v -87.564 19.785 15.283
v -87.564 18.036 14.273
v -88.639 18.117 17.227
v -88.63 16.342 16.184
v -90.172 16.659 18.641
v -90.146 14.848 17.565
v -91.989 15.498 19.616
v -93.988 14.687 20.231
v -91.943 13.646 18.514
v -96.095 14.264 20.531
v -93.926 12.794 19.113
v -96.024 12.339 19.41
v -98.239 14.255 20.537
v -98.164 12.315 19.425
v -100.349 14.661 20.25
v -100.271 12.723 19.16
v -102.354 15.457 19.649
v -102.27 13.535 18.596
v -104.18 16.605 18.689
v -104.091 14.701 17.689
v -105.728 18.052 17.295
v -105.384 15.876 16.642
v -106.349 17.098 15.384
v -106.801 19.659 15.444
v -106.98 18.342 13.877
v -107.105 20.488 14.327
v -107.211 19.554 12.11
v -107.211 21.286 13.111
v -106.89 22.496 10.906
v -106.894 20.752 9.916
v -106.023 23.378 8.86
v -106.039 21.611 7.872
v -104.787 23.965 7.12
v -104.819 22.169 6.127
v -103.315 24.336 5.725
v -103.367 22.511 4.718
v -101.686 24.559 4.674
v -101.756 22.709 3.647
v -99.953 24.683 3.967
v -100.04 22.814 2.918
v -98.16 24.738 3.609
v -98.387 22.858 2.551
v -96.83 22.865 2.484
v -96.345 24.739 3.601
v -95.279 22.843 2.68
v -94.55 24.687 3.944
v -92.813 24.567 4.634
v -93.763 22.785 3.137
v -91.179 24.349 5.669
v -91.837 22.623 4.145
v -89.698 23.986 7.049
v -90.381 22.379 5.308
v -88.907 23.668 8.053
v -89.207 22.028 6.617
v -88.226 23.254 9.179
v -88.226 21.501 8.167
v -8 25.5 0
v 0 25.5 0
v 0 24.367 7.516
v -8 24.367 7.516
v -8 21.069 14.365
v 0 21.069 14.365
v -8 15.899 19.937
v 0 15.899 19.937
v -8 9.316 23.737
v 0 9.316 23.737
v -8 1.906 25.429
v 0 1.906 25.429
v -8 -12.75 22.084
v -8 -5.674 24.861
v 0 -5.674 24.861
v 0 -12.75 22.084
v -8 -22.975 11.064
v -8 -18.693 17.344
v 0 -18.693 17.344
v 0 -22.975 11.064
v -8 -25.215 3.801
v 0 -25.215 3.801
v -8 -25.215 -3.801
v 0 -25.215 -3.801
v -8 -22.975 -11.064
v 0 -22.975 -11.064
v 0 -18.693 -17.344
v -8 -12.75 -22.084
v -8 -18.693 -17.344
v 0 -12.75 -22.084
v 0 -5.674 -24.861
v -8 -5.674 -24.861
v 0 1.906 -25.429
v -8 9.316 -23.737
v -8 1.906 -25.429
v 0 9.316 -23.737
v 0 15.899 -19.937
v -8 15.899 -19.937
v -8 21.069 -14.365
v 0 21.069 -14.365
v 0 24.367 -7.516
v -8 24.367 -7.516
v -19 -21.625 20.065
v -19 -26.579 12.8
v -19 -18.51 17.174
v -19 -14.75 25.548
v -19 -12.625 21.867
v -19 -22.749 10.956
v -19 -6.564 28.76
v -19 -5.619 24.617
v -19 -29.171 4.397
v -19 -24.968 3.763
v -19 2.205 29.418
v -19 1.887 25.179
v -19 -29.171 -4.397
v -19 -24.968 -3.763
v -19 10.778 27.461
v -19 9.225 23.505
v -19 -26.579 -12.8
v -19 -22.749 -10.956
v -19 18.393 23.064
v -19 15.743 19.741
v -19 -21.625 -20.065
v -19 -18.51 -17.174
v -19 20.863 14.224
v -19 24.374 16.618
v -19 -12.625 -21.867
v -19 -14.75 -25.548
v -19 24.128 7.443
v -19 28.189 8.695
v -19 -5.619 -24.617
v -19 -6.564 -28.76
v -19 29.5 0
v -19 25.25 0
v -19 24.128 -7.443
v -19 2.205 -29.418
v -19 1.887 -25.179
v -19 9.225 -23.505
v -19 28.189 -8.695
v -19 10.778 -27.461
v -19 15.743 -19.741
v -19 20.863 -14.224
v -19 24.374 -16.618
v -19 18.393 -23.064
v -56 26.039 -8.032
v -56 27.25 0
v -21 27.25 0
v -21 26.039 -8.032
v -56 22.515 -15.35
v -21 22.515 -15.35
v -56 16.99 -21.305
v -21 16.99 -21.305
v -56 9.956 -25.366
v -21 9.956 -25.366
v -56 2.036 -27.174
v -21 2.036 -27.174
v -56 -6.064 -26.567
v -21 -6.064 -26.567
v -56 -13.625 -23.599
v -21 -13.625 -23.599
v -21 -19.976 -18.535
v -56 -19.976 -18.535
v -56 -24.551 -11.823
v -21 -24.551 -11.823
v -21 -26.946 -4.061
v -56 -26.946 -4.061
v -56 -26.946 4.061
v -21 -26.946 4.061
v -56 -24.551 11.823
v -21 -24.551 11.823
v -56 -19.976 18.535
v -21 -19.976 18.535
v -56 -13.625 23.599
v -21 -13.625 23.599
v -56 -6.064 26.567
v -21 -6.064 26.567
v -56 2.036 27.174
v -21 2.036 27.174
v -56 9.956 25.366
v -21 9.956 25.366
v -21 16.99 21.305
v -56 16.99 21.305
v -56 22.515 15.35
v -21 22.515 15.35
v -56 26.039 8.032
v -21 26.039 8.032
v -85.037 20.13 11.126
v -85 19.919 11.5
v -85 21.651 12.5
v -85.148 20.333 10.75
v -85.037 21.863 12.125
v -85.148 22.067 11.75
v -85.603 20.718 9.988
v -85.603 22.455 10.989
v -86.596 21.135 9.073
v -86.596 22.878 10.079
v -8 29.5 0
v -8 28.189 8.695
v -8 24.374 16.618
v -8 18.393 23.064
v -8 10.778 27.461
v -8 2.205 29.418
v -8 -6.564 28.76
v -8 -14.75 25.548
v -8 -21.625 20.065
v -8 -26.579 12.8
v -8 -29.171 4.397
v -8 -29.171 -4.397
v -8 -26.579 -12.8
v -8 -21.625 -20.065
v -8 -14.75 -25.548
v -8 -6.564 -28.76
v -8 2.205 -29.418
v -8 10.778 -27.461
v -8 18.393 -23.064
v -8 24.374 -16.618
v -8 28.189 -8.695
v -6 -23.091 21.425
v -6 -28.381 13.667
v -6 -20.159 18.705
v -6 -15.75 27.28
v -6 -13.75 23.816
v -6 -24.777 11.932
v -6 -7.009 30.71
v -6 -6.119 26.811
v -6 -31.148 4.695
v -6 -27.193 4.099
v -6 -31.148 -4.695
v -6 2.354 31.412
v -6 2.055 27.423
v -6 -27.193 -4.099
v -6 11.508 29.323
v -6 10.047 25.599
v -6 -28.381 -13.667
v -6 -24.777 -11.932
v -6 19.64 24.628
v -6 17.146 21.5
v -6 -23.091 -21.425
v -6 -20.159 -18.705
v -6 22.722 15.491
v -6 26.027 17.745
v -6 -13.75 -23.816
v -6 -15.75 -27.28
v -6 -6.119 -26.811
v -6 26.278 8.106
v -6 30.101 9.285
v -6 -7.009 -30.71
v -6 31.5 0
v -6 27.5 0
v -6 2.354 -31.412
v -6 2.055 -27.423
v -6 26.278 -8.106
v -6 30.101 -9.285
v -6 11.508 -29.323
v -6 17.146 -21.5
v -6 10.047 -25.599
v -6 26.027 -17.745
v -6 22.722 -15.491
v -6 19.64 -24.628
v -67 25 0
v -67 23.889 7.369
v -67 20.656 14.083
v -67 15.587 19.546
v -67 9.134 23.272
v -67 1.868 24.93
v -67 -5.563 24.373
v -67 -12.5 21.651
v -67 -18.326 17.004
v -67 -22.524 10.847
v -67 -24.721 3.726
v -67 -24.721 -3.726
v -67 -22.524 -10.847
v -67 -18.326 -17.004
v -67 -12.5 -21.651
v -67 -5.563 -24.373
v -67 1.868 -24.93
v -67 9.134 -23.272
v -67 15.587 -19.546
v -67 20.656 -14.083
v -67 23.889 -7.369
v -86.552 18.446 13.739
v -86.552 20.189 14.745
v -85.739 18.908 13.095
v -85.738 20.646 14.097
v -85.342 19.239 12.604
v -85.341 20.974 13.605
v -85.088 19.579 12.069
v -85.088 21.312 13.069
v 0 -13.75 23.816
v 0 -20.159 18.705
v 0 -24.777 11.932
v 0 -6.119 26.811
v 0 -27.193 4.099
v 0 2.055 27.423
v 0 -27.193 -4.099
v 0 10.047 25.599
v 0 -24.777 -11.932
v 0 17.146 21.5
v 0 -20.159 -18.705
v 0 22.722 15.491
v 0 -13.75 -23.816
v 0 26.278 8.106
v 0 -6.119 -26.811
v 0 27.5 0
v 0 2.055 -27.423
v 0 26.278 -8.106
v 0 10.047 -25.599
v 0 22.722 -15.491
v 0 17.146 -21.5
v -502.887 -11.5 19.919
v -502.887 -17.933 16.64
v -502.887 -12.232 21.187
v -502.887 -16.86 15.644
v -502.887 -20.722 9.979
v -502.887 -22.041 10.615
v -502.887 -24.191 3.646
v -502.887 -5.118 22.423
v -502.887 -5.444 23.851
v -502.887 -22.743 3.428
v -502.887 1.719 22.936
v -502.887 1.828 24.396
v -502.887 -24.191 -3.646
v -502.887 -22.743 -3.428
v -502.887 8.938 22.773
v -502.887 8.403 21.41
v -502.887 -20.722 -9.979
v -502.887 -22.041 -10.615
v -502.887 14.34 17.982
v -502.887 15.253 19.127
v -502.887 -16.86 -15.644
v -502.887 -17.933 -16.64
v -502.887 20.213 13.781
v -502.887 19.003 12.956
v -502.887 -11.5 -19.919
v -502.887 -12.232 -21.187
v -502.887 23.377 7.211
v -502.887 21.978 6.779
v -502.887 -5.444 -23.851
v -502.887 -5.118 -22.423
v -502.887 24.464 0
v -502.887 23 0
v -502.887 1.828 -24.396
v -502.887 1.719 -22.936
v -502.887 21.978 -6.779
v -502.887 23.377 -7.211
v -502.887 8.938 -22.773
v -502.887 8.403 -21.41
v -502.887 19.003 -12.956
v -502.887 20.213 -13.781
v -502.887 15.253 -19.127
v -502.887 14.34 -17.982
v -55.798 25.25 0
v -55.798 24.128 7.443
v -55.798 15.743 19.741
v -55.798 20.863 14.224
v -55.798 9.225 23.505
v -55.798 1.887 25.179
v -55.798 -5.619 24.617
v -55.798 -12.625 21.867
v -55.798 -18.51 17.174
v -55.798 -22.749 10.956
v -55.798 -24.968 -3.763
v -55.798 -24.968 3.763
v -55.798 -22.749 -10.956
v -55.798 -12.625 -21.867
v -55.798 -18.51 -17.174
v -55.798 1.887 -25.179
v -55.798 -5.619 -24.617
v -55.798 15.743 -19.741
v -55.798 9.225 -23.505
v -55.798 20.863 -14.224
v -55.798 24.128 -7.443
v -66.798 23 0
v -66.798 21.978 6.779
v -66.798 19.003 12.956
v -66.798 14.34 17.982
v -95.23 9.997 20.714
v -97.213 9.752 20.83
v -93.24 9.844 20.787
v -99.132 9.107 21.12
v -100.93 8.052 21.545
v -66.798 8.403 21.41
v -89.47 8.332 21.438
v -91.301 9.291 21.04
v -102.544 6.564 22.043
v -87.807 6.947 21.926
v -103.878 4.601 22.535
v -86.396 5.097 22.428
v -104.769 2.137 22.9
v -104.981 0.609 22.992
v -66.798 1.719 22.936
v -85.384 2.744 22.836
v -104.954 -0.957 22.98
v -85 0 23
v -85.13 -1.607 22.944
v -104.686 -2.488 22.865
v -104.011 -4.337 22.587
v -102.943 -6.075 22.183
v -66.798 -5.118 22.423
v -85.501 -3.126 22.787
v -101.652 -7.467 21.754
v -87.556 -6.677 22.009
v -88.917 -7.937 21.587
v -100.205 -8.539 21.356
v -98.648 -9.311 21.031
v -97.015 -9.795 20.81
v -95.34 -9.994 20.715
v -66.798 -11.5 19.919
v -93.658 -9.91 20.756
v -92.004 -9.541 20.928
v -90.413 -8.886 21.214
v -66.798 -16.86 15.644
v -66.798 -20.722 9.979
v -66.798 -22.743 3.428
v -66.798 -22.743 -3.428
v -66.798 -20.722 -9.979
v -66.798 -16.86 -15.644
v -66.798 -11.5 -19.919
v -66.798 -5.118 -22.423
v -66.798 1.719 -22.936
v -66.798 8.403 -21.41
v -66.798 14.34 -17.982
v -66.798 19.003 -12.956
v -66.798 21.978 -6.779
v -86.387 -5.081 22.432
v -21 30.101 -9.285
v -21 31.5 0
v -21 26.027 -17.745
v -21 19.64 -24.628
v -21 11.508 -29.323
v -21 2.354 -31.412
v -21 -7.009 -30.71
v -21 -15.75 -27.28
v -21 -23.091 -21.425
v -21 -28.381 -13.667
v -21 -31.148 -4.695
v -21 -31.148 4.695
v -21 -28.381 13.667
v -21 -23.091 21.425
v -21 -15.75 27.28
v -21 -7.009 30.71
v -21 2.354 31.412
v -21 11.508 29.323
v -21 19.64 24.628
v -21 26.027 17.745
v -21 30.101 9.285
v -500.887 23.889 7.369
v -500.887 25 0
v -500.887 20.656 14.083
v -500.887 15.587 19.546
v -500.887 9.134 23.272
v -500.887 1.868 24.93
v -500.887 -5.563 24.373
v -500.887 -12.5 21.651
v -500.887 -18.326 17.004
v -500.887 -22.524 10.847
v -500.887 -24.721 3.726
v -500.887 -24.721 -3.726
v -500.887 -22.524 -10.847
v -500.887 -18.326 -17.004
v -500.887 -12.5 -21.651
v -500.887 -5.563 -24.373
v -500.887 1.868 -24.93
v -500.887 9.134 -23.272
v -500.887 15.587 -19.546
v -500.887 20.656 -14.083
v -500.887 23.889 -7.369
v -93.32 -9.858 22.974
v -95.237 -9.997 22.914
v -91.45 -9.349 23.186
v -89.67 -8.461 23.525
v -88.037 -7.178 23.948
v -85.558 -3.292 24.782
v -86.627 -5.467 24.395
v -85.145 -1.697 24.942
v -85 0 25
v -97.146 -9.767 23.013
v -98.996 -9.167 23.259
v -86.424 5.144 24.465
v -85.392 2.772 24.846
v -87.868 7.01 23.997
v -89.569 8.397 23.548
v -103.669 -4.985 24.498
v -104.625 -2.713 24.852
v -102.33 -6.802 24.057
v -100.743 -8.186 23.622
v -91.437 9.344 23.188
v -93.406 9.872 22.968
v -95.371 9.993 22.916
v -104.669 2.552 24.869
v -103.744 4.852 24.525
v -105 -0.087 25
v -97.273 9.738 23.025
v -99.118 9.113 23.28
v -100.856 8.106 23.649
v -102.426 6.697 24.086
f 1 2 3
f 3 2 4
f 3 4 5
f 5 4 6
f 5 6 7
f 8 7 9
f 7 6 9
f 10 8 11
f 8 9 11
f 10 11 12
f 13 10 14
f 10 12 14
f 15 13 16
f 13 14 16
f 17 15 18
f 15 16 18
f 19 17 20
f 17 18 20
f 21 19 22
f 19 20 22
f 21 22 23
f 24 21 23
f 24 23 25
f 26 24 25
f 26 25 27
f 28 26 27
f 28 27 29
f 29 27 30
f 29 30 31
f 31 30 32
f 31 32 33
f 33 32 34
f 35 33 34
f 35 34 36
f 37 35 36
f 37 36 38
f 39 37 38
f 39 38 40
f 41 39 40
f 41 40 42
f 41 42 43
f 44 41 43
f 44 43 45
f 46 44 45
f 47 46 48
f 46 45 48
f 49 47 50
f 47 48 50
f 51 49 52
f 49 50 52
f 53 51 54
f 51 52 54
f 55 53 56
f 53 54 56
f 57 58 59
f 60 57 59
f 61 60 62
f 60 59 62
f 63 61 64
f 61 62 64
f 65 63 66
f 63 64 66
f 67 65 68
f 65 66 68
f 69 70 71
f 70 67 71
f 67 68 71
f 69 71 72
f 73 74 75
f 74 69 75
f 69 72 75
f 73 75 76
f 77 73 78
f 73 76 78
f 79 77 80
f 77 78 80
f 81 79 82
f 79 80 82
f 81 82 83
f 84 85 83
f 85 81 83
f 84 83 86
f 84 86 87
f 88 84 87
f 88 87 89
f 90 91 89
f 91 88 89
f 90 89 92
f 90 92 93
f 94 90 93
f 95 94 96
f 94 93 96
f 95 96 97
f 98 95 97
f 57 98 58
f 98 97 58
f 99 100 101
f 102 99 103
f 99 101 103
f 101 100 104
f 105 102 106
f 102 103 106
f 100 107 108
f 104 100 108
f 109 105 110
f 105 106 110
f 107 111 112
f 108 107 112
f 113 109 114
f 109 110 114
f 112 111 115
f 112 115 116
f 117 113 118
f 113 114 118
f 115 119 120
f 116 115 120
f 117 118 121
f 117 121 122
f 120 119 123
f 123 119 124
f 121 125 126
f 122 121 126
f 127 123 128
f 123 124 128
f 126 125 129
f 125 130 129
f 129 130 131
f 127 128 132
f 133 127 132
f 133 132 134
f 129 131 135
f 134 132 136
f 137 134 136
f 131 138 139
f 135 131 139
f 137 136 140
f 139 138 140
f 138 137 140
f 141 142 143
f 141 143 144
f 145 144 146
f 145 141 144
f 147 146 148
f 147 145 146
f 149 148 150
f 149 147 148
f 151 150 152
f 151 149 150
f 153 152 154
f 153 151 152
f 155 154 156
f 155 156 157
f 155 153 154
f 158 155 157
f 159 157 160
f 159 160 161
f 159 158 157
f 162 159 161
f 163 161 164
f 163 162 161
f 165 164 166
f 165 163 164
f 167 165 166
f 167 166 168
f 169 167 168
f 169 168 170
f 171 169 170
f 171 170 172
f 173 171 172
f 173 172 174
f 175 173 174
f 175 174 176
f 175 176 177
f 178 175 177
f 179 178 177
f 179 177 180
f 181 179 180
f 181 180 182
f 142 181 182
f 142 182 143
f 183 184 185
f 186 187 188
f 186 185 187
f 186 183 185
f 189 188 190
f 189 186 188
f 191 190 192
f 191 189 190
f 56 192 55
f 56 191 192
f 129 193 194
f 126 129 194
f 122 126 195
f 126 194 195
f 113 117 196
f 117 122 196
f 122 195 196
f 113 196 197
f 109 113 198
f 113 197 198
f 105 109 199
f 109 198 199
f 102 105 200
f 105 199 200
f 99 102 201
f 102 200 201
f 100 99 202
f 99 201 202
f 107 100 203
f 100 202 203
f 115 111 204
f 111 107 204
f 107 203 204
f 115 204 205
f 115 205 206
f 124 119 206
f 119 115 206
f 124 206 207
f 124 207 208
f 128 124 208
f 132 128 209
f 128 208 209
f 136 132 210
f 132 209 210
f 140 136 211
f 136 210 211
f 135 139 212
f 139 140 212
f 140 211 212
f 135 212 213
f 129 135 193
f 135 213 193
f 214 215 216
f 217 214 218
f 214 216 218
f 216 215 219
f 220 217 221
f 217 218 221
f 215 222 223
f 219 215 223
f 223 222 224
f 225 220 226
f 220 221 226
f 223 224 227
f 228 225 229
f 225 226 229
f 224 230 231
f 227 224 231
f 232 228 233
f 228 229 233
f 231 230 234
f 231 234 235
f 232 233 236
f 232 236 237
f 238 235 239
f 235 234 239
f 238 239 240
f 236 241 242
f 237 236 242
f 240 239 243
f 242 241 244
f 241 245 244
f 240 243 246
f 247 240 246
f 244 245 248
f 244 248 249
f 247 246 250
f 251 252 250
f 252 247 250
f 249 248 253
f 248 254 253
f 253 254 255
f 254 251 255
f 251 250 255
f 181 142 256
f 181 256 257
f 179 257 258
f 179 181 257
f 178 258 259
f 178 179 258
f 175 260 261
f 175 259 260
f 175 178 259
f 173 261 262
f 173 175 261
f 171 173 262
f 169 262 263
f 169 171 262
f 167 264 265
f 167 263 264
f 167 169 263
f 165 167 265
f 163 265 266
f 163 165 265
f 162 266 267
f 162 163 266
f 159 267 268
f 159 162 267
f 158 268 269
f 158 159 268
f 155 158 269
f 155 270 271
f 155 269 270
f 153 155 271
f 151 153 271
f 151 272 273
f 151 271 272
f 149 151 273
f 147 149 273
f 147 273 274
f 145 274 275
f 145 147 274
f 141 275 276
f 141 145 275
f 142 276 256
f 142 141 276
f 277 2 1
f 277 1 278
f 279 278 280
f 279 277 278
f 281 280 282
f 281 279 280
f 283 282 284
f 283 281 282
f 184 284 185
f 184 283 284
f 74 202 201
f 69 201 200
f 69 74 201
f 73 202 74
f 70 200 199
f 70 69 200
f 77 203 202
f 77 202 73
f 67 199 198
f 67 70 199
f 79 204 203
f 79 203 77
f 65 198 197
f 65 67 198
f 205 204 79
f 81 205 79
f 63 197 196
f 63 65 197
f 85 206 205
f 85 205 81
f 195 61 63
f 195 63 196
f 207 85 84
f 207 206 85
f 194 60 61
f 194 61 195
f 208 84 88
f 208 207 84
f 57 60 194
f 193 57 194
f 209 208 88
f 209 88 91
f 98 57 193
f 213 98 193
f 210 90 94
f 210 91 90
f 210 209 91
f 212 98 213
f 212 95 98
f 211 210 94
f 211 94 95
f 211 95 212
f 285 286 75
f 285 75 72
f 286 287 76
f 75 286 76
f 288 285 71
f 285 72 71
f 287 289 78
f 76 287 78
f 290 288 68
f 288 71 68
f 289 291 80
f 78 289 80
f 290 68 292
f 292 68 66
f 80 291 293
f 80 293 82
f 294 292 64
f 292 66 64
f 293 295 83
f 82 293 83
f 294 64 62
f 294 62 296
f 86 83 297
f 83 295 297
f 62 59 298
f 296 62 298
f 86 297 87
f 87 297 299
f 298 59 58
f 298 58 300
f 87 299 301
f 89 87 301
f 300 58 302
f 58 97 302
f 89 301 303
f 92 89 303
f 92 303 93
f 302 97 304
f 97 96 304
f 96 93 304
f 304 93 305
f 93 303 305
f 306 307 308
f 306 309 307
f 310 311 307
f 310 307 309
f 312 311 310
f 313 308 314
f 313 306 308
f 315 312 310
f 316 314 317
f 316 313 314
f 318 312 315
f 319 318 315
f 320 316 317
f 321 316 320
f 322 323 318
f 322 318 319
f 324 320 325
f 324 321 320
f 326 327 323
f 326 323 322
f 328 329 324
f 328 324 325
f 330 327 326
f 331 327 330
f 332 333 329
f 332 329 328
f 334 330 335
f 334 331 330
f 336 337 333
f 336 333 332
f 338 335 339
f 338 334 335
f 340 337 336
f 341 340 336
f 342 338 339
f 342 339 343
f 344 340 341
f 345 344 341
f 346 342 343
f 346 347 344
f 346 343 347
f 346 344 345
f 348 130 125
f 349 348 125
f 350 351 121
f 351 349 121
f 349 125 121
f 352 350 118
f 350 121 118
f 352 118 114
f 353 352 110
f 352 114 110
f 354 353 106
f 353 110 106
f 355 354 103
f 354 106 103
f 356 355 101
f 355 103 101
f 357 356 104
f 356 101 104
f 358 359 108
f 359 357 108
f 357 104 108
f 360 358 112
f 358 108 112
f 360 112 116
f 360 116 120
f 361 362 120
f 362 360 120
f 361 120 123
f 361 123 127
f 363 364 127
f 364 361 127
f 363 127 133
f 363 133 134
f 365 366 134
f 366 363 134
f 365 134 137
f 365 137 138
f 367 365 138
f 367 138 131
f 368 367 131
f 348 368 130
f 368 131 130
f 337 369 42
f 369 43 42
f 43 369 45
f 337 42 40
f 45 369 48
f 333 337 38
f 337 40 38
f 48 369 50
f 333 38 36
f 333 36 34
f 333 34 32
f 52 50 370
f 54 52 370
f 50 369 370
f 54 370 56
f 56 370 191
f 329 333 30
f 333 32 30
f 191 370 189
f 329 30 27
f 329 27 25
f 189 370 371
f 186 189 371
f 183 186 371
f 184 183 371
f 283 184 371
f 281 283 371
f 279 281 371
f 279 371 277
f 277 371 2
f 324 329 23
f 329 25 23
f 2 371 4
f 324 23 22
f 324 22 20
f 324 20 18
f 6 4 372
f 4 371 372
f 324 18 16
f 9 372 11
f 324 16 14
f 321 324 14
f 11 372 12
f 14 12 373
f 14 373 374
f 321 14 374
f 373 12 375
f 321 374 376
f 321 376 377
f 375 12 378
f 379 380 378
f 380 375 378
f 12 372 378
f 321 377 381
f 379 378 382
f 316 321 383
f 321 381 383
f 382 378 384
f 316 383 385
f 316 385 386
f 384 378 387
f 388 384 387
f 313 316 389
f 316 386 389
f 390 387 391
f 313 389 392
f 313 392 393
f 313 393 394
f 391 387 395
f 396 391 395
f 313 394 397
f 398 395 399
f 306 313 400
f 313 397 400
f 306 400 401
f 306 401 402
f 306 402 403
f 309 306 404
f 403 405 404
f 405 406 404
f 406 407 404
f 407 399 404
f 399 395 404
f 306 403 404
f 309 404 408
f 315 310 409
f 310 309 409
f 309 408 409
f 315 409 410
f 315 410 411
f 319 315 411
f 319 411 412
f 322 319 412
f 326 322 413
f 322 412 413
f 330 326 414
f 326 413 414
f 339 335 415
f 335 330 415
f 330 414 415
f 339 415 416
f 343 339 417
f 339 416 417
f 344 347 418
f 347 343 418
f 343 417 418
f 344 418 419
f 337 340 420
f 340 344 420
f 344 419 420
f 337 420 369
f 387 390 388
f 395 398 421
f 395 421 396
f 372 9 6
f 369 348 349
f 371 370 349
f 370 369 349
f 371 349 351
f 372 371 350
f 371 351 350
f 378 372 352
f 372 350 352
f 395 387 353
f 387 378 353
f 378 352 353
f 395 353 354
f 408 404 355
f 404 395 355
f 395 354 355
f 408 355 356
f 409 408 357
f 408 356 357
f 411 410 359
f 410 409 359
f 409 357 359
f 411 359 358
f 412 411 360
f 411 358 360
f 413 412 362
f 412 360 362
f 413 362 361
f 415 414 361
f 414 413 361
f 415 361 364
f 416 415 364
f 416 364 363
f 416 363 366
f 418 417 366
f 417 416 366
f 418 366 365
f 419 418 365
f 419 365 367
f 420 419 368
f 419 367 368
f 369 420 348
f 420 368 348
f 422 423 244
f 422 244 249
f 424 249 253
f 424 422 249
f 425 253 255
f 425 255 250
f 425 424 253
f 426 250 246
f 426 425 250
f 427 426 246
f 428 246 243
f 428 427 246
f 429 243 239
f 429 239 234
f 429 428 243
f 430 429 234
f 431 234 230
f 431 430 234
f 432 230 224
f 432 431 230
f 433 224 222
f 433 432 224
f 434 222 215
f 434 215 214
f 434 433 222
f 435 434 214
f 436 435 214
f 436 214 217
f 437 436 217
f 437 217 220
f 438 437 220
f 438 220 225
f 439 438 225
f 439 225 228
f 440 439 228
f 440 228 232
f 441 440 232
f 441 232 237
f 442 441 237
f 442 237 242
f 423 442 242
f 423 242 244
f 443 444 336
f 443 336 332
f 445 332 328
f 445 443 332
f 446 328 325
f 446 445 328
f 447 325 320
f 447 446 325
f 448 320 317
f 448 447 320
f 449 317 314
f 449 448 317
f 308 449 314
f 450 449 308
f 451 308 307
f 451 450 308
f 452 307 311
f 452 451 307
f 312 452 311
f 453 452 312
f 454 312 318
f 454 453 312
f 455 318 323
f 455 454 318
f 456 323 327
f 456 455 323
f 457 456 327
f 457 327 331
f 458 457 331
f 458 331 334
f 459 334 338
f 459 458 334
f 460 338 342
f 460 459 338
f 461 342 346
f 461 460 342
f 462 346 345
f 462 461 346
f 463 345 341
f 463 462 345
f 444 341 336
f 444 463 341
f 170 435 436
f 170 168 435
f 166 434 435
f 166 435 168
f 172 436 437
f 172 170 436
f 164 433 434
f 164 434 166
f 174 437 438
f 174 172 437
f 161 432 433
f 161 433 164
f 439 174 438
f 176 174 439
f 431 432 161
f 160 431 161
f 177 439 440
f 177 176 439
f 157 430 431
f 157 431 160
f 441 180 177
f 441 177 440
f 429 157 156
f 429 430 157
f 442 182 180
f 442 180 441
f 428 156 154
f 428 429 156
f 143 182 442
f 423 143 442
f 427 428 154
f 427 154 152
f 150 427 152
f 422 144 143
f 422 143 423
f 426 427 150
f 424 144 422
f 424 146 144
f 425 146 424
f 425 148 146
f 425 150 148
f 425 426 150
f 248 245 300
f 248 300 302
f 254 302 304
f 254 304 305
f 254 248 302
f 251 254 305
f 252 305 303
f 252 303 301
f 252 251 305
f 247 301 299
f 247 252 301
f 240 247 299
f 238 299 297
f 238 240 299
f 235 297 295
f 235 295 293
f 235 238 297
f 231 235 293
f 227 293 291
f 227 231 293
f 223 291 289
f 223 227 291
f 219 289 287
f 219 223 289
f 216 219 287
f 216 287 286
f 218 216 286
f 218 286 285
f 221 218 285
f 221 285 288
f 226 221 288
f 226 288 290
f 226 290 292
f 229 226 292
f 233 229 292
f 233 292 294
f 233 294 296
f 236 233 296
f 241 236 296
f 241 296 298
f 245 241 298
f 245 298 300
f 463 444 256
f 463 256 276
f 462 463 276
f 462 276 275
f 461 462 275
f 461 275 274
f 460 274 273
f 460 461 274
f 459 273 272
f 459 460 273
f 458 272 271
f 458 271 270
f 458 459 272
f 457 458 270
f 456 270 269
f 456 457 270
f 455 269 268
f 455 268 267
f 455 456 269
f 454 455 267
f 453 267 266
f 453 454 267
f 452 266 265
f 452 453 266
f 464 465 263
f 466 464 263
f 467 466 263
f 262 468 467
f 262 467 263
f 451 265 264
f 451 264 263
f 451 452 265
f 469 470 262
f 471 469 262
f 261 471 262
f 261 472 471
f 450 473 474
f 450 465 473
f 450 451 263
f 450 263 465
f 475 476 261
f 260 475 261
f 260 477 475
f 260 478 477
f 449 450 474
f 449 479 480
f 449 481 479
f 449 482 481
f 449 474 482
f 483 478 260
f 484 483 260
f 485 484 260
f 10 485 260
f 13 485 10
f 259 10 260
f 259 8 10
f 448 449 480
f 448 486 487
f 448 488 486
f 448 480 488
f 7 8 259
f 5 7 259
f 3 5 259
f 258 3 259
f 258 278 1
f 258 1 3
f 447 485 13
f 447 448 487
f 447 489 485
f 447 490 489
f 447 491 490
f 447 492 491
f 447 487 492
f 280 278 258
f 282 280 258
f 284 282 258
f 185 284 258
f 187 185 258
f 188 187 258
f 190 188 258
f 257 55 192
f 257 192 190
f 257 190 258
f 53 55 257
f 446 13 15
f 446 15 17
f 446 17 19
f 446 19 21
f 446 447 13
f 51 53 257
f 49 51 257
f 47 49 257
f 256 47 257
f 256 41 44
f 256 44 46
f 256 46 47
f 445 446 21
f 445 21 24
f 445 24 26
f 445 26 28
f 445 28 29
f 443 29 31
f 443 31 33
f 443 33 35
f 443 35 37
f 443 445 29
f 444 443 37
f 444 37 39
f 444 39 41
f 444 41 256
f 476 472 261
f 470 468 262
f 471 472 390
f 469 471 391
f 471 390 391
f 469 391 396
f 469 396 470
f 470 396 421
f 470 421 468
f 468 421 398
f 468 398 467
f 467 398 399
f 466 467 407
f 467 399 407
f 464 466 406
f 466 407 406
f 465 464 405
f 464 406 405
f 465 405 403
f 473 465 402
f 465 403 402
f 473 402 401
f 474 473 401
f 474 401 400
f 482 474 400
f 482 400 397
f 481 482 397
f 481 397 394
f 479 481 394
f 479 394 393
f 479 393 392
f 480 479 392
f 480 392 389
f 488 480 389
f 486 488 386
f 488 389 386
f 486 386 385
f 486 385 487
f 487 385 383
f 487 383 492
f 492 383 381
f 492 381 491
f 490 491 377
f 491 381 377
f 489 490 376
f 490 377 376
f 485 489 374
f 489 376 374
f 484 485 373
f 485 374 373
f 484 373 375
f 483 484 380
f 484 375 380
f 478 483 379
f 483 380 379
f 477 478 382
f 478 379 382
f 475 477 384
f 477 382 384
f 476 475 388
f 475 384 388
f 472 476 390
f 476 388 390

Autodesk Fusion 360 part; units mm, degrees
sketch "Skizze1" plane through (0, 0, 0) normal (0, 0, 1) x (1, 0, 0)
  line L0 (-502.8868, 23) -> (-66.7976, 23)
  line L1 (-66.7976, 23) -> (-55.7976, 25.25)
  line L2 (-55.7976, 25.25) -> (-19, 25.25)
  line L3 (-19, 25.25) -> (-19, 29.5)
  line L4 (-19, 29.5) -> (-8, 29.5)
  line L5 (-8, 29.5) -> (-8, 25.5)
  line L6 (-8, 25.5) -> (0, 25.5)
  line L7 (0, 27.5) -> (-6, 27.5)
  line L8 (-6, 27.5) -> (-6, 31.5)
  line L9 (-6, 31.5) -> (-21, 31.5)
  line L10 (-21, 31.5) -> (-21, 27.25)
  line L11 (-21, 27.25) -> (-56, 27.25)
  line L12 (-56, 27.25) -> (-67, 25)
  line L13 (-67, 25) -> (-500.8868, 25)
  line L14 (0, 0) -> (-103.5201, 0)
  line L15 (-502.8868, 23) -> (-502.8868, 24.4641)
  line L16 (-502.8868, 24.4641) -> (-500.8868, 25)
  line L17 (0, 25.5) -> (0, 27.5)
  dimension "d2" = 15
  dimension "d3" = 2
  dimension "d4" = 2
  dimension "d5" = 63
  dimension "d6" = 2
  dimension "d7" = 55
  dimension "d8" = 54.5
  dimension "d10" = 50
  dimension "d12" = 2
  dimension "d13" = 2
  dimension "d14" = 2
  dimension "d15" = 35
  dimension "d16" = 46
  dimension "d17" = 2
  dimension "d18" = 2
  dimension "d19" = 15
  dimension "d21" = 6
revolve "Drehen1" add sketch "Skizze1" angle 360 about axis through (0, 0, 0) along (-1, 0, 0)
sketch "Skizze2" plane through (0, 0, 0) normal (0, 0, 1) x (1, 0, 0)
  line L0 (0, 0) -> (-160, 0) construction
  circle A0 centre (-95, 0) radius 10
  dimension "d23" = 20
extrude "Extrusion1" cut sketch "Skizze2" along normal up to surface end surface at (-211.6289, 24.9689, 1.2461)
ref_plane "Arbeitsebene1" through (-51.76, 0, 0) normal (0, 0.866, -0.5) x (-1, 0, 0)
sketch "Skizze3" plane through (0, 0, 0) normal (0, 0.866, -0.5) x (-1, 0, 0)
  line L0 (0, 0) -> (140, 0)
  spline S0 degree 3 poles (95, 12.9374) (93.7247, 12.9374) (92.3784, 13.1794) (89.9209, 14.081) (88.808, 14.7328) (87.0511, 16.1029) (86.2839, 16.9168) (85.2579, 18.508) (85, 19.2819) (85, 20.5553) (85.2579, 21.1286) (86.2839, 21.9966) (87.0511, 22.2961) (88.808, 22.683) (89.9209, 22.7974) (92.3784, 22.921) (93.7247, 22.9374) (96.2753, 22.9374) (97.6216, 22.921) (100.0791, 22.7974) (101.192, 22.683) (102.9489, 22.2961) (103.7161, 21.9966) (104.7421, 21.1286) (105, 20.5553) (105, 19.2819) (104.7421, 18.508) (103.7161, 16.9168) (102.9489, 16.1029) (101.192, 14.7328) (100.0791, 14.081) (97.6216, 13.1794) (96.2753, 12.9374) (95, 12.9374) knots 0 0 0 0 0.382584 0.382584 0.765167 0.765167 1.147194 1.147194 1.52922 1.52922 1.911247 1.911247 2.293273 2.293273 2.675857 2.675857 3.058441 3.058441 3.441024 3.441024 3.823608 3.823608 4.205634 4.205634 4.587661 4.587661 4.969687 4.969687 5.351714 5.351714 5.734298 5.734298 6.116881 6.116881 6.116881 6.116881
  spline S1 degree 3 poles (95, 14.8431) (96.2719, 14.8431) (97.6172, 15.0731) (100.0759, 15.9379) (101.1907, 16.566) (102.9506, 17.8954) (103.7181, 18.6888) (104.7432, 20.2505) (105, 21.0153) (105, 22.2859) (104.7432, 22.8669) (103.7181, 23.7652) (102.9506, 24.0869) (101.1907, 24.5175) (100.0759, 24.6562) (97.6172, 24.816) (96.2719, 24.8431) (93.7281, 24.8431) (92.3828, 24.816) (89.9241, 24.6562) (88.8093, 24.5175) (87.0494, 24.0869) (86.2819, 23.7652) (85.2568, 22.8669) (85, 22.2859) (85, 21.0153) (85.2568, 20.2505) (86.2819, 18.6888) (87.0494, 17.8954) (88.8093, 16.566) (89.9241, 15.9379) (92.3828, 15.0731) (93.7281, 14.8431) (95, 14.8431) knots 0 0 0 0 0.381558 0.381558 0.763115 0.763115 1.144287 1.144287 1.525459 1.525459 1.90663 1.90663 2.287802 2.287802 2.66936 2.66936 3.050917 3.050917 3.432475 3.432475 3.814033 3.814033 4.195204 4.195204 4.576376 4.576376 4.957548 4.957548 5.338719 5.338719 5.720277 5.720277 6.101835 6.101835 6.101835 6.101835
  spline S2 degree 3 poles (95, 12.9374) (93.7247, 12.9374) (92.3784, 13.1794) (89.9209, 14.081) (88.808, 14.7328) (87.0511, 16.1029) (86.2839, 16.9168) (85.2579, 18.508) (85, 19.2819) (85, 20.5553) (85.2579, 21.1286) (86.2839, 21.9966) (87.0511, 22.2961) (88.808, 22.683) (89.9209, 22.7974) (92.3784, 22.921) (93.7247, 22.9374) (96.2753, 22.9374) (97.6216, 22.921) (100.0791, 22.7974) (101.192, 22.683) (102.9489, 22.2961) (103.7161, 21.9966) (104.7421, 21.1286) (105, 20.5553) (105, 19.2819) (104.7421, 18.508) (103.7161, 16.9168) (102.9489, 16.1029) (101.192, 14.7328) (100.0791, 14.081) (97.6216, 13.1794) (96.2753, 12.9374) (95, 12.9374) knots 0 0 0 0 0.382584 0.382584 0.765167 0.765167 1.147194 1.147194 1.52922 1.52922 1.911247 1.911247 2.293273 2.293273 2.675857 2.675857 3.058441 3.058441 3.441024 3.441024 3.823608 3.823608 4.205634 4.205634 4.587661 4.587661 4.969687 4.969687 5.351714 5.351714 5.734298 5.734298 6.116881 6.116881 6.116881 6.116881
  line L1 (95, 12.9374) -> (95, 0) construction
  circle A0 centre (95, 0) radius 10
extrude "Extrusion2" cut sketch "Skizze3" along direction (0, 0.866025, 0.5) up to surface contours L0 A0 | L0 A0 end surface at (-211.6289, 24.9689, 1.2461)
ref_plane "Arbeitsebene2" through (-51.76, 0, 0) normal (0, -0.866, -0.5) x (-1, 0, 0)
sketch "Skizze4" plane through (0, 0, 0) normal (0, -0.866, -0.5) x (-1, 0, 0)
  circle A0 centre (97.2112, -0.7111) radius 10
  spline S0 degree 3 poles (95, -22.9374) (93.7247, -22.9374) (92.3784, -22.921) (89.9209, -22.7974) (88.808, -22.683) (87.0511, -22.2961) (86.2839, -21.9966) (85.2579, -21.1286) (85, -20.5553) (85, -19.2819) (85.2579, -18.508) (86.2839, -16.9168) (87.0511, -16.1029) (88.808, -14.7328) (89.9209, -14.081) (92.3784, -13.1794) (93.7247, -12.9374) (96.2753, -12.9374) (97.6216, -13.1794) (100.0791, -14.081) (101.192, -14.7328) (102.9489, -16.1029) (103.7161, -16.9168) (104.7421, -18.508) (105, -19.2819) (105, -20.5553) (104.7421, -21.1286) (103.7161, -21.9966) (102.9489, -22.2961) (101.192, -22.683) (100.0791, -22.7974) (97.6216, -22.921) (96.2753, -22.9374) (95, -22.9374) knots 0 0 0 0 0.382584 0.382584 0.765167 0.765167 1.147194 1.147194 1.52922 1.52922 1.911247 1.911247 2.293273 2.293273 2.675857 2.675857 3.058441 3.058441 3.441024 3.441024 3.823608 3.823608 4.205634 4.205634 4.587661 4.587661 4.969687 4.969687 5.351714 5.351714 5.734298 5.734298 6.116881 6.116881 6.116881 6.116881
  spline S1 degree 3 poles (95, -24.8431) (96.2719, -24.8431) (97.6172, -24.816) (100.0759, -24.6562) (101.1907, -24.5175) (102.9506, -24.0869) (103.7181, -23.7652) (104.7432, -22.8669) (105, -22.2859) (105, -21.0153) (104.7432, -20.2505) (103.7181, -18.6888) (102.9506, -17.8954) (101.1907, -16.566) (100.0759, -15.9379) (97.6172, -15.0731) (96.2719, -14.8431) (93.7281, -14.8431) (92.3828, -15.0731) (89.9241, -15.9379) (88.8093, -16.566) (87.0494, -17.8954) (86.2819, -18.6888) (85.2568, -20.2505) (85, -21.0153) (85, -22.2859) (85.2568, -22.8669) (86.2819, -23.7652) (87.0494, -24.0869) (88.8093, -24.5175) (89.9241, -24.6562) (92.3828, -24.816) (93.7281, -24.8431) (95, -24.8431) knots 0 0 0 0 0.381558 0.381558 0.763115 0.763115 1.144287 1.144287 1.525459 1.525459 1.90663 1.90663 2.287802 2.287802 2.66936 2.66936 3.050917 3.050917 3.432475 3.432475 3.814033 3.814033 4.195204 4.195204 4.576376 4.576376 4.957548 4.957548 5.338719 5.338719 5.720277 5.720277 6.101835 6.101835 6.101835 6.101835
  dimension "d30" = 20
extrude "Extrusion3" cut sketch "Skizze4" along normal up to surface contours A0 end surface at (-221.189, 16.6886, 18.6143)
